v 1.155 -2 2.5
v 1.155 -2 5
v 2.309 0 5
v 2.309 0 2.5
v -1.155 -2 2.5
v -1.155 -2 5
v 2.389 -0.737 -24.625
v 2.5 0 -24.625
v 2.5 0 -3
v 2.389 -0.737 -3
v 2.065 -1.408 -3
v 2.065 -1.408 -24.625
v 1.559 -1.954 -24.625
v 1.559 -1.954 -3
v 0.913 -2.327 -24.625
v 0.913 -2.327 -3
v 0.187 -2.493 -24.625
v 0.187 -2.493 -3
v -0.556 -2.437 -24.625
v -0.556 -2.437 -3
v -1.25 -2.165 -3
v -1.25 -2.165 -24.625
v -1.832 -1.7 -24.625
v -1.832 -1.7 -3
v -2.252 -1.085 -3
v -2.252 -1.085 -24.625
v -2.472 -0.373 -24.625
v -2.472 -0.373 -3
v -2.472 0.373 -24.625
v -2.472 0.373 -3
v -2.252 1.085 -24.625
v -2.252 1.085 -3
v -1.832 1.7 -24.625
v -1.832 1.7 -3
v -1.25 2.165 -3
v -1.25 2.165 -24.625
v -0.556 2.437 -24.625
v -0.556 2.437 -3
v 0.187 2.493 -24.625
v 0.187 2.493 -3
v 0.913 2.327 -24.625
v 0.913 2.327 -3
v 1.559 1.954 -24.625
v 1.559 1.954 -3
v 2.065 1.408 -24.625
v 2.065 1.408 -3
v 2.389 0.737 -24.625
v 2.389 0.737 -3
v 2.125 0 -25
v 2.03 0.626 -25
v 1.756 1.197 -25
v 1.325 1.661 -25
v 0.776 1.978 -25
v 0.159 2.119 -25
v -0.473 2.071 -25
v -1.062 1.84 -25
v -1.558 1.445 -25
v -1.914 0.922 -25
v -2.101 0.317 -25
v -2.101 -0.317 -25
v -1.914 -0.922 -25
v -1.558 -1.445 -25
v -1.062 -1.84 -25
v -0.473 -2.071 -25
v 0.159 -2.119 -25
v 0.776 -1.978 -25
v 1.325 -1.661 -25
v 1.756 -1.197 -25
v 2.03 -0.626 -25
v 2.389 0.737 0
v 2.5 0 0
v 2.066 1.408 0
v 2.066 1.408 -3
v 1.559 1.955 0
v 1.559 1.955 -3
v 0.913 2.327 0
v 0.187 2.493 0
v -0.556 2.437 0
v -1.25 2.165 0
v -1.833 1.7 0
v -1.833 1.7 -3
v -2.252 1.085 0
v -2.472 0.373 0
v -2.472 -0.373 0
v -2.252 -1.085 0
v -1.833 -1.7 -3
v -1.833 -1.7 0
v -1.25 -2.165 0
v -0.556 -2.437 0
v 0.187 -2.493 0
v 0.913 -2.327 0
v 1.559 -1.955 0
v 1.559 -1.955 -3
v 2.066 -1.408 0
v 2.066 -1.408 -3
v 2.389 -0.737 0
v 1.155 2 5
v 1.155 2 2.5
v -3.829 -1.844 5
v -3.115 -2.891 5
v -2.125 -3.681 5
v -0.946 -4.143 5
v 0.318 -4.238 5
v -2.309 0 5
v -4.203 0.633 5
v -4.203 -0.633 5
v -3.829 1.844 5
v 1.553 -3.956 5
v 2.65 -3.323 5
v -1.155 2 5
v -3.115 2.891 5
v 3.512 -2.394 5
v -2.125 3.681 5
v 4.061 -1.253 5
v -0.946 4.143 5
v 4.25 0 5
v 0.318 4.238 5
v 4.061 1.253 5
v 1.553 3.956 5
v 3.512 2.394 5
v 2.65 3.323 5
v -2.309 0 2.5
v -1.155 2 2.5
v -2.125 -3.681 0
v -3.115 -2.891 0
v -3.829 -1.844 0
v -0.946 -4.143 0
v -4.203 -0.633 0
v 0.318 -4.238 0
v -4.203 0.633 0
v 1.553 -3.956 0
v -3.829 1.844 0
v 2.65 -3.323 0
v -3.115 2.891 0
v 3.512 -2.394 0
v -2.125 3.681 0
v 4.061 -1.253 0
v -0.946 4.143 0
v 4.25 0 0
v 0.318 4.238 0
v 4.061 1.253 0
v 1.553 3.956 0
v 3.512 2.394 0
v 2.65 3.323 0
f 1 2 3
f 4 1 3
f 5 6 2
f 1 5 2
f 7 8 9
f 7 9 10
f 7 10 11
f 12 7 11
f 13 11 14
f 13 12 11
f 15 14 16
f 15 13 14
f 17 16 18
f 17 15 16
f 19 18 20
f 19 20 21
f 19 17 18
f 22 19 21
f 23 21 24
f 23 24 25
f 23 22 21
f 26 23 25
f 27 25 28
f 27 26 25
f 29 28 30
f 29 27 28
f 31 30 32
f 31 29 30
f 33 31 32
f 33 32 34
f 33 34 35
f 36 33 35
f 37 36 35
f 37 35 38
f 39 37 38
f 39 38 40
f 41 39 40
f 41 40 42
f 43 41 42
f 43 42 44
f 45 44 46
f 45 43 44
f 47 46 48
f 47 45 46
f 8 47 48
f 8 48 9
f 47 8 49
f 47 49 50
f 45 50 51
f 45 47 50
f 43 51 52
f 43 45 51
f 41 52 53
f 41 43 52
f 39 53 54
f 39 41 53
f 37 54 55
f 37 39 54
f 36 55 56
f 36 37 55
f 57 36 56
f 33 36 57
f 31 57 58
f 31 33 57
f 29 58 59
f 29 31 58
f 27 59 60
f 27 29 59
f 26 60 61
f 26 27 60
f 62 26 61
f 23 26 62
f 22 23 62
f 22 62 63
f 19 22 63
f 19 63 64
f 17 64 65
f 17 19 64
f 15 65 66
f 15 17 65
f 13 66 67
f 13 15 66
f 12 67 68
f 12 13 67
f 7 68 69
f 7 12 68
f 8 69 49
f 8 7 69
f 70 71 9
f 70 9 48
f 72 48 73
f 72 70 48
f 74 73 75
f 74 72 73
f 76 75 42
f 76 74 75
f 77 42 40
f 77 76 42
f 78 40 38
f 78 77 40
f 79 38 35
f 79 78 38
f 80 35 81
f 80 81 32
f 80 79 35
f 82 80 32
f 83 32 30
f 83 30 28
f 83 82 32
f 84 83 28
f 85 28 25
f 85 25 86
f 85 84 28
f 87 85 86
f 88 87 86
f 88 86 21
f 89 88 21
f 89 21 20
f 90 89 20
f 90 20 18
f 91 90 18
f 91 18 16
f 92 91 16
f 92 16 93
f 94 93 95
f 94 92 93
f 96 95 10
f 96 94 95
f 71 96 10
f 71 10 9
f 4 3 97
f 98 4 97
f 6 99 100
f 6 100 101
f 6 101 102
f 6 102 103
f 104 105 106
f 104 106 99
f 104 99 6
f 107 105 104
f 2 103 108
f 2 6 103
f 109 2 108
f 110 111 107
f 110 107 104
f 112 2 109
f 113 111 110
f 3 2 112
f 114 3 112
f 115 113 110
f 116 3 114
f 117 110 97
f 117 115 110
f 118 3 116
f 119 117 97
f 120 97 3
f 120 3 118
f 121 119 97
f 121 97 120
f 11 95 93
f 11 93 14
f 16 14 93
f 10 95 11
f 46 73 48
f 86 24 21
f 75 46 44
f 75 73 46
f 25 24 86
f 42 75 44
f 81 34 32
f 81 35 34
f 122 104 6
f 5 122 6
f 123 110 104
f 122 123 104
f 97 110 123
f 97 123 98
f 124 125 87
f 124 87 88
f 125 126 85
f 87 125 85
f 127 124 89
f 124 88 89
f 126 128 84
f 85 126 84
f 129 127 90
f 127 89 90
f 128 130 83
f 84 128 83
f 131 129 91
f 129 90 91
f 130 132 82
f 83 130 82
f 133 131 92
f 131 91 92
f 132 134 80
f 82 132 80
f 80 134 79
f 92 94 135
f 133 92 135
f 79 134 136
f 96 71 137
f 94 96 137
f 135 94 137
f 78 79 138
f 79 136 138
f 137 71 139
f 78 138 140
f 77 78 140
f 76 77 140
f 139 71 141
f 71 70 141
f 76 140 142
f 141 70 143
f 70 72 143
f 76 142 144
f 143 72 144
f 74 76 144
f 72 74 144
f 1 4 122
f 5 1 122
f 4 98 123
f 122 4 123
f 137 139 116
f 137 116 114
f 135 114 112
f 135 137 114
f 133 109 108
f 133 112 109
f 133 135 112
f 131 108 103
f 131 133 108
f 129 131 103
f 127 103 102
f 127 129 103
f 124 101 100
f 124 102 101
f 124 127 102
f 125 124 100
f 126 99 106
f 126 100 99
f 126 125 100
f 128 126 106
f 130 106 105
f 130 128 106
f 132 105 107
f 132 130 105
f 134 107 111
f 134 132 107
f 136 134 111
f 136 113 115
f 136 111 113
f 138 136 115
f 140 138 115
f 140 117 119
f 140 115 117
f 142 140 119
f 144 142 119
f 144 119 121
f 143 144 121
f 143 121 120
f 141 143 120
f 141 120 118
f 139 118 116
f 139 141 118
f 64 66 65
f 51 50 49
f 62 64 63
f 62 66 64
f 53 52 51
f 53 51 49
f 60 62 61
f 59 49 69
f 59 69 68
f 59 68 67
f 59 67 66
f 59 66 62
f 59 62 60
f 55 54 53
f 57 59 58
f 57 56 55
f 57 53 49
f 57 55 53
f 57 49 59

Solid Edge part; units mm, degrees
sketch "Sketch1" plane through (0, 0, 0) normal (0, 0, 1) x (1, 0, 0)
  circle A0 centre (0, 0) radius 4.25
  dimension "D1" = 8.5
extrude "Protrusion1" add sketch "Sketch1" along normal blind 5
sketch "Sketch2" plane through (0, 0, 0) normal (0, 0, -1) x (1, 0, 0)
  circle A0 centre (0, 0) radius 2.5
extrude "Protrusion2" add sketch "Sketch2" along normal blind 25
sketch "Sketch3" plane through (0, 0, -25) normal (0, 0, -1) x (1, 0, 0)
  circle A0 centre (0, 0) radius 2.4997
extrude "Cutout1" cut sketch "Sketch3" against normal blind 22 flip side to cut
chamfer "Chamfer_1" distance 0.375 angle 45 1 edges at (-2.4997, 0, -25)
sketch "Sketch4" plane through (0, 0, 5) normal (0, 0, 1) x (1, 0, 0)
  line L0 (-1.1547, 2) -> (1.1547, 2)
  line L1 (2.3094, 0) -> (1.1547, 2)
  line L2 (1.1547, -2) -> (2.3094, 0)
  line L3 (-1.1547, -2) -> (1.1547, -2)
  line L4 (-2.3094, 0) -> (-1.1547, -2)
  line L5 (-1.1547, 2) -> (-2.3094, 0)
  dimension "D1" = 4
extrude "Cutout2" cut sketch "Sketch4" against normal blind 2.5
properties part number "24104801"
